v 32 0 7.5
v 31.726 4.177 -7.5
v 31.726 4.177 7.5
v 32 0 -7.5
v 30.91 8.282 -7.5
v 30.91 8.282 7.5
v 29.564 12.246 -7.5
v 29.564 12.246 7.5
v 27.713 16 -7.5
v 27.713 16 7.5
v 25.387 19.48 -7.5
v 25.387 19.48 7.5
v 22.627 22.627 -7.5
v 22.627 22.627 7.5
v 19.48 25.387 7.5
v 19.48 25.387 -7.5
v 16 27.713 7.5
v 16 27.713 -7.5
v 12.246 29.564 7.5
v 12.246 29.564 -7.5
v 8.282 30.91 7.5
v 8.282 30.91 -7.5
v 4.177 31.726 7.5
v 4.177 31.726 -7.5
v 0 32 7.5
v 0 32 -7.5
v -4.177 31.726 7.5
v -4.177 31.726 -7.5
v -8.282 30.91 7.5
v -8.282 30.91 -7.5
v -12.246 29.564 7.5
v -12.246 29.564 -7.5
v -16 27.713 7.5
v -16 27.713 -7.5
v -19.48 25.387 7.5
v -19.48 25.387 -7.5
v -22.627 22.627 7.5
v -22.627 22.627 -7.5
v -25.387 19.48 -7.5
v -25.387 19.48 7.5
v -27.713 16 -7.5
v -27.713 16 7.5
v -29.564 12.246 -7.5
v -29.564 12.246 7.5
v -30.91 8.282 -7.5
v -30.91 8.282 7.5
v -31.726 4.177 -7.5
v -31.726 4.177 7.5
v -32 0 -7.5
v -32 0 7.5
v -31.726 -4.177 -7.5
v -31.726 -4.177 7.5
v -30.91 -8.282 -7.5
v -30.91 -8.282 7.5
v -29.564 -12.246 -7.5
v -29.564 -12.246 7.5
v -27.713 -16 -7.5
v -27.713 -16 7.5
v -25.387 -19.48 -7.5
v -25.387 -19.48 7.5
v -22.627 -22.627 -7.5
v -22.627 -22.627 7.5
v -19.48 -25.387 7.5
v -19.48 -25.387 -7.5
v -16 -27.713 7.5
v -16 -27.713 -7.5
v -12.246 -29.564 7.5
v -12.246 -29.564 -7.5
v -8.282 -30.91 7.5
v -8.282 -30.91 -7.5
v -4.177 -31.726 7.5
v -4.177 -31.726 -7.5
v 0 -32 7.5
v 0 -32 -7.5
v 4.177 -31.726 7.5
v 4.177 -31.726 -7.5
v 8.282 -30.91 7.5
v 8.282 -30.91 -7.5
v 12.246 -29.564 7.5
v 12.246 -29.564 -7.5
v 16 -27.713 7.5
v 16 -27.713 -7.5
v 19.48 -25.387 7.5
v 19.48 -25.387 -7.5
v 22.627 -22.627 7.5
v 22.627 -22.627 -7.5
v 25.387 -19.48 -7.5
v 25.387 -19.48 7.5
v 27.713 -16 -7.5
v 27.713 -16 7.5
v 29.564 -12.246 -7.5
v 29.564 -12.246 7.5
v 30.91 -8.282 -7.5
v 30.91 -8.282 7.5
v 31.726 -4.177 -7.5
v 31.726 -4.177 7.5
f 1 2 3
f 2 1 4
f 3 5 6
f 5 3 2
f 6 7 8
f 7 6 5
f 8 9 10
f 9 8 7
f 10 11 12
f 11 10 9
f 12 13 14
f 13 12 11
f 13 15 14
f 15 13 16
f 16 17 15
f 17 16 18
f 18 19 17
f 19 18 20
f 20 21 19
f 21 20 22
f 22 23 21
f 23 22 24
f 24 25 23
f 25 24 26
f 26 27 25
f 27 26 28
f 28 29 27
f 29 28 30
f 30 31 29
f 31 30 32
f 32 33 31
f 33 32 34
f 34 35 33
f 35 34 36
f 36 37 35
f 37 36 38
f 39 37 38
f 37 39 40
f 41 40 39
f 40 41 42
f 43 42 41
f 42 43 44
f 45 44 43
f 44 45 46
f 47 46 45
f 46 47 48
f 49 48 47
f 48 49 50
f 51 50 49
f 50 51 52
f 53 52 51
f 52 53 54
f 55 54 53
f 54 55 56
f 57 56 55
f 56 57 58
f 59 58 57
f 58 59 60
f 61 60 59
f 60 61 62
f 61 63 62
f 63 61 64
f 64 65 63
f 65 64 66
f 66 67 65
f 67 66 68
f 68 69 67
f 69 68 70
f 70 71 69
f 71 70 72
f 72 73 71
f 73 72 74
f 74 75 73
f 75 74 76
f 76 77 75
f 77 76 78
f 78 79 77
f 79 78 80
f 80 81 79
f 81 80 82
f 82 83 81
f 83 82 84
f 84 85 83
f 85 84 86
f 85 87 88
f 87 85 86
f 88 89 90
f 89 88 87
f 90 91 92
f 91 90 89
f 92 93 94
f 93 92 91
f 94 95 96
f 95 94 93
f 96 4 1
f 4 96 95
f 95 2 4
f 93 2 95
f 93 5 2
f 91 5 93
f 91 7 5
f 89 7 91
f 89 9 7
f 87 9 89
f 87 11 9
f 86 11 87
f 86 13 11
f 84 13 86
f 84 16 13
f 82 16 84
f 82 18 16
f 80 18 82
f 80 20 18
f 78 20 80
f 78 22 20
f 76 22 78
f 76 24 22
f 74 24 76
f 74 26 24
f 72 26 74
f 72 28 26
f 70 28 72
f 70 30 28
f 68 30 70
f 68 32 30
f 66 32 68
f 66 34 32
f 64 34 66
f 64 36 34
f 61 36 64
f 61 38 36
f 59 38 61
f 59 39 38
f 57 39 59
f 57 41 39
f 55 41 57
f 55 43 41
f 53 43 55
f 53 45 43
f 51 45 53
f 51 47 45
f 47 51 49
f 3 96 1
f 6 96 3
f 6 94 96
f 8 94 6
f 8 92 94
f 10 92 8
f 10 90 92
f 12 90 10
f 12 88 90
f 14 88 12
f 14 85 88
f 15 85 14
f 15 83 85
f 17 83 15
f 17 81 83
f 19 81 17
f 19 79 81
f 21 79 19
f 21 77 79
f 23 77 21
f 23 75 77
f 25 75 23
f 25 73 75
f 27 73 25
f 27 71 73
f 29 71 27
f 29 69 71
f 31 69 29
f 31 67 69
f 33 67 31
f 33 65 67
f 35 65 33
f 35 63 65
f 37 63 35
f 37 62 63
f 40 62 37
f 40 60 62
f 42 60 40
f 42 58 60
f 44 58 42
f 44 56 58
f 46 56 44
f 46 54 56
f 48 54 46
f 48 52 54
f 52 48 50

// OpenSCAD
// ========================================
// a cylinder with radius 32 mm and height 15 mm
// NeuroCAD canonical IR; dimensions are millimetres
// ========================================
$fn = 48;

cylinder(r=32, h=15, center=true);
